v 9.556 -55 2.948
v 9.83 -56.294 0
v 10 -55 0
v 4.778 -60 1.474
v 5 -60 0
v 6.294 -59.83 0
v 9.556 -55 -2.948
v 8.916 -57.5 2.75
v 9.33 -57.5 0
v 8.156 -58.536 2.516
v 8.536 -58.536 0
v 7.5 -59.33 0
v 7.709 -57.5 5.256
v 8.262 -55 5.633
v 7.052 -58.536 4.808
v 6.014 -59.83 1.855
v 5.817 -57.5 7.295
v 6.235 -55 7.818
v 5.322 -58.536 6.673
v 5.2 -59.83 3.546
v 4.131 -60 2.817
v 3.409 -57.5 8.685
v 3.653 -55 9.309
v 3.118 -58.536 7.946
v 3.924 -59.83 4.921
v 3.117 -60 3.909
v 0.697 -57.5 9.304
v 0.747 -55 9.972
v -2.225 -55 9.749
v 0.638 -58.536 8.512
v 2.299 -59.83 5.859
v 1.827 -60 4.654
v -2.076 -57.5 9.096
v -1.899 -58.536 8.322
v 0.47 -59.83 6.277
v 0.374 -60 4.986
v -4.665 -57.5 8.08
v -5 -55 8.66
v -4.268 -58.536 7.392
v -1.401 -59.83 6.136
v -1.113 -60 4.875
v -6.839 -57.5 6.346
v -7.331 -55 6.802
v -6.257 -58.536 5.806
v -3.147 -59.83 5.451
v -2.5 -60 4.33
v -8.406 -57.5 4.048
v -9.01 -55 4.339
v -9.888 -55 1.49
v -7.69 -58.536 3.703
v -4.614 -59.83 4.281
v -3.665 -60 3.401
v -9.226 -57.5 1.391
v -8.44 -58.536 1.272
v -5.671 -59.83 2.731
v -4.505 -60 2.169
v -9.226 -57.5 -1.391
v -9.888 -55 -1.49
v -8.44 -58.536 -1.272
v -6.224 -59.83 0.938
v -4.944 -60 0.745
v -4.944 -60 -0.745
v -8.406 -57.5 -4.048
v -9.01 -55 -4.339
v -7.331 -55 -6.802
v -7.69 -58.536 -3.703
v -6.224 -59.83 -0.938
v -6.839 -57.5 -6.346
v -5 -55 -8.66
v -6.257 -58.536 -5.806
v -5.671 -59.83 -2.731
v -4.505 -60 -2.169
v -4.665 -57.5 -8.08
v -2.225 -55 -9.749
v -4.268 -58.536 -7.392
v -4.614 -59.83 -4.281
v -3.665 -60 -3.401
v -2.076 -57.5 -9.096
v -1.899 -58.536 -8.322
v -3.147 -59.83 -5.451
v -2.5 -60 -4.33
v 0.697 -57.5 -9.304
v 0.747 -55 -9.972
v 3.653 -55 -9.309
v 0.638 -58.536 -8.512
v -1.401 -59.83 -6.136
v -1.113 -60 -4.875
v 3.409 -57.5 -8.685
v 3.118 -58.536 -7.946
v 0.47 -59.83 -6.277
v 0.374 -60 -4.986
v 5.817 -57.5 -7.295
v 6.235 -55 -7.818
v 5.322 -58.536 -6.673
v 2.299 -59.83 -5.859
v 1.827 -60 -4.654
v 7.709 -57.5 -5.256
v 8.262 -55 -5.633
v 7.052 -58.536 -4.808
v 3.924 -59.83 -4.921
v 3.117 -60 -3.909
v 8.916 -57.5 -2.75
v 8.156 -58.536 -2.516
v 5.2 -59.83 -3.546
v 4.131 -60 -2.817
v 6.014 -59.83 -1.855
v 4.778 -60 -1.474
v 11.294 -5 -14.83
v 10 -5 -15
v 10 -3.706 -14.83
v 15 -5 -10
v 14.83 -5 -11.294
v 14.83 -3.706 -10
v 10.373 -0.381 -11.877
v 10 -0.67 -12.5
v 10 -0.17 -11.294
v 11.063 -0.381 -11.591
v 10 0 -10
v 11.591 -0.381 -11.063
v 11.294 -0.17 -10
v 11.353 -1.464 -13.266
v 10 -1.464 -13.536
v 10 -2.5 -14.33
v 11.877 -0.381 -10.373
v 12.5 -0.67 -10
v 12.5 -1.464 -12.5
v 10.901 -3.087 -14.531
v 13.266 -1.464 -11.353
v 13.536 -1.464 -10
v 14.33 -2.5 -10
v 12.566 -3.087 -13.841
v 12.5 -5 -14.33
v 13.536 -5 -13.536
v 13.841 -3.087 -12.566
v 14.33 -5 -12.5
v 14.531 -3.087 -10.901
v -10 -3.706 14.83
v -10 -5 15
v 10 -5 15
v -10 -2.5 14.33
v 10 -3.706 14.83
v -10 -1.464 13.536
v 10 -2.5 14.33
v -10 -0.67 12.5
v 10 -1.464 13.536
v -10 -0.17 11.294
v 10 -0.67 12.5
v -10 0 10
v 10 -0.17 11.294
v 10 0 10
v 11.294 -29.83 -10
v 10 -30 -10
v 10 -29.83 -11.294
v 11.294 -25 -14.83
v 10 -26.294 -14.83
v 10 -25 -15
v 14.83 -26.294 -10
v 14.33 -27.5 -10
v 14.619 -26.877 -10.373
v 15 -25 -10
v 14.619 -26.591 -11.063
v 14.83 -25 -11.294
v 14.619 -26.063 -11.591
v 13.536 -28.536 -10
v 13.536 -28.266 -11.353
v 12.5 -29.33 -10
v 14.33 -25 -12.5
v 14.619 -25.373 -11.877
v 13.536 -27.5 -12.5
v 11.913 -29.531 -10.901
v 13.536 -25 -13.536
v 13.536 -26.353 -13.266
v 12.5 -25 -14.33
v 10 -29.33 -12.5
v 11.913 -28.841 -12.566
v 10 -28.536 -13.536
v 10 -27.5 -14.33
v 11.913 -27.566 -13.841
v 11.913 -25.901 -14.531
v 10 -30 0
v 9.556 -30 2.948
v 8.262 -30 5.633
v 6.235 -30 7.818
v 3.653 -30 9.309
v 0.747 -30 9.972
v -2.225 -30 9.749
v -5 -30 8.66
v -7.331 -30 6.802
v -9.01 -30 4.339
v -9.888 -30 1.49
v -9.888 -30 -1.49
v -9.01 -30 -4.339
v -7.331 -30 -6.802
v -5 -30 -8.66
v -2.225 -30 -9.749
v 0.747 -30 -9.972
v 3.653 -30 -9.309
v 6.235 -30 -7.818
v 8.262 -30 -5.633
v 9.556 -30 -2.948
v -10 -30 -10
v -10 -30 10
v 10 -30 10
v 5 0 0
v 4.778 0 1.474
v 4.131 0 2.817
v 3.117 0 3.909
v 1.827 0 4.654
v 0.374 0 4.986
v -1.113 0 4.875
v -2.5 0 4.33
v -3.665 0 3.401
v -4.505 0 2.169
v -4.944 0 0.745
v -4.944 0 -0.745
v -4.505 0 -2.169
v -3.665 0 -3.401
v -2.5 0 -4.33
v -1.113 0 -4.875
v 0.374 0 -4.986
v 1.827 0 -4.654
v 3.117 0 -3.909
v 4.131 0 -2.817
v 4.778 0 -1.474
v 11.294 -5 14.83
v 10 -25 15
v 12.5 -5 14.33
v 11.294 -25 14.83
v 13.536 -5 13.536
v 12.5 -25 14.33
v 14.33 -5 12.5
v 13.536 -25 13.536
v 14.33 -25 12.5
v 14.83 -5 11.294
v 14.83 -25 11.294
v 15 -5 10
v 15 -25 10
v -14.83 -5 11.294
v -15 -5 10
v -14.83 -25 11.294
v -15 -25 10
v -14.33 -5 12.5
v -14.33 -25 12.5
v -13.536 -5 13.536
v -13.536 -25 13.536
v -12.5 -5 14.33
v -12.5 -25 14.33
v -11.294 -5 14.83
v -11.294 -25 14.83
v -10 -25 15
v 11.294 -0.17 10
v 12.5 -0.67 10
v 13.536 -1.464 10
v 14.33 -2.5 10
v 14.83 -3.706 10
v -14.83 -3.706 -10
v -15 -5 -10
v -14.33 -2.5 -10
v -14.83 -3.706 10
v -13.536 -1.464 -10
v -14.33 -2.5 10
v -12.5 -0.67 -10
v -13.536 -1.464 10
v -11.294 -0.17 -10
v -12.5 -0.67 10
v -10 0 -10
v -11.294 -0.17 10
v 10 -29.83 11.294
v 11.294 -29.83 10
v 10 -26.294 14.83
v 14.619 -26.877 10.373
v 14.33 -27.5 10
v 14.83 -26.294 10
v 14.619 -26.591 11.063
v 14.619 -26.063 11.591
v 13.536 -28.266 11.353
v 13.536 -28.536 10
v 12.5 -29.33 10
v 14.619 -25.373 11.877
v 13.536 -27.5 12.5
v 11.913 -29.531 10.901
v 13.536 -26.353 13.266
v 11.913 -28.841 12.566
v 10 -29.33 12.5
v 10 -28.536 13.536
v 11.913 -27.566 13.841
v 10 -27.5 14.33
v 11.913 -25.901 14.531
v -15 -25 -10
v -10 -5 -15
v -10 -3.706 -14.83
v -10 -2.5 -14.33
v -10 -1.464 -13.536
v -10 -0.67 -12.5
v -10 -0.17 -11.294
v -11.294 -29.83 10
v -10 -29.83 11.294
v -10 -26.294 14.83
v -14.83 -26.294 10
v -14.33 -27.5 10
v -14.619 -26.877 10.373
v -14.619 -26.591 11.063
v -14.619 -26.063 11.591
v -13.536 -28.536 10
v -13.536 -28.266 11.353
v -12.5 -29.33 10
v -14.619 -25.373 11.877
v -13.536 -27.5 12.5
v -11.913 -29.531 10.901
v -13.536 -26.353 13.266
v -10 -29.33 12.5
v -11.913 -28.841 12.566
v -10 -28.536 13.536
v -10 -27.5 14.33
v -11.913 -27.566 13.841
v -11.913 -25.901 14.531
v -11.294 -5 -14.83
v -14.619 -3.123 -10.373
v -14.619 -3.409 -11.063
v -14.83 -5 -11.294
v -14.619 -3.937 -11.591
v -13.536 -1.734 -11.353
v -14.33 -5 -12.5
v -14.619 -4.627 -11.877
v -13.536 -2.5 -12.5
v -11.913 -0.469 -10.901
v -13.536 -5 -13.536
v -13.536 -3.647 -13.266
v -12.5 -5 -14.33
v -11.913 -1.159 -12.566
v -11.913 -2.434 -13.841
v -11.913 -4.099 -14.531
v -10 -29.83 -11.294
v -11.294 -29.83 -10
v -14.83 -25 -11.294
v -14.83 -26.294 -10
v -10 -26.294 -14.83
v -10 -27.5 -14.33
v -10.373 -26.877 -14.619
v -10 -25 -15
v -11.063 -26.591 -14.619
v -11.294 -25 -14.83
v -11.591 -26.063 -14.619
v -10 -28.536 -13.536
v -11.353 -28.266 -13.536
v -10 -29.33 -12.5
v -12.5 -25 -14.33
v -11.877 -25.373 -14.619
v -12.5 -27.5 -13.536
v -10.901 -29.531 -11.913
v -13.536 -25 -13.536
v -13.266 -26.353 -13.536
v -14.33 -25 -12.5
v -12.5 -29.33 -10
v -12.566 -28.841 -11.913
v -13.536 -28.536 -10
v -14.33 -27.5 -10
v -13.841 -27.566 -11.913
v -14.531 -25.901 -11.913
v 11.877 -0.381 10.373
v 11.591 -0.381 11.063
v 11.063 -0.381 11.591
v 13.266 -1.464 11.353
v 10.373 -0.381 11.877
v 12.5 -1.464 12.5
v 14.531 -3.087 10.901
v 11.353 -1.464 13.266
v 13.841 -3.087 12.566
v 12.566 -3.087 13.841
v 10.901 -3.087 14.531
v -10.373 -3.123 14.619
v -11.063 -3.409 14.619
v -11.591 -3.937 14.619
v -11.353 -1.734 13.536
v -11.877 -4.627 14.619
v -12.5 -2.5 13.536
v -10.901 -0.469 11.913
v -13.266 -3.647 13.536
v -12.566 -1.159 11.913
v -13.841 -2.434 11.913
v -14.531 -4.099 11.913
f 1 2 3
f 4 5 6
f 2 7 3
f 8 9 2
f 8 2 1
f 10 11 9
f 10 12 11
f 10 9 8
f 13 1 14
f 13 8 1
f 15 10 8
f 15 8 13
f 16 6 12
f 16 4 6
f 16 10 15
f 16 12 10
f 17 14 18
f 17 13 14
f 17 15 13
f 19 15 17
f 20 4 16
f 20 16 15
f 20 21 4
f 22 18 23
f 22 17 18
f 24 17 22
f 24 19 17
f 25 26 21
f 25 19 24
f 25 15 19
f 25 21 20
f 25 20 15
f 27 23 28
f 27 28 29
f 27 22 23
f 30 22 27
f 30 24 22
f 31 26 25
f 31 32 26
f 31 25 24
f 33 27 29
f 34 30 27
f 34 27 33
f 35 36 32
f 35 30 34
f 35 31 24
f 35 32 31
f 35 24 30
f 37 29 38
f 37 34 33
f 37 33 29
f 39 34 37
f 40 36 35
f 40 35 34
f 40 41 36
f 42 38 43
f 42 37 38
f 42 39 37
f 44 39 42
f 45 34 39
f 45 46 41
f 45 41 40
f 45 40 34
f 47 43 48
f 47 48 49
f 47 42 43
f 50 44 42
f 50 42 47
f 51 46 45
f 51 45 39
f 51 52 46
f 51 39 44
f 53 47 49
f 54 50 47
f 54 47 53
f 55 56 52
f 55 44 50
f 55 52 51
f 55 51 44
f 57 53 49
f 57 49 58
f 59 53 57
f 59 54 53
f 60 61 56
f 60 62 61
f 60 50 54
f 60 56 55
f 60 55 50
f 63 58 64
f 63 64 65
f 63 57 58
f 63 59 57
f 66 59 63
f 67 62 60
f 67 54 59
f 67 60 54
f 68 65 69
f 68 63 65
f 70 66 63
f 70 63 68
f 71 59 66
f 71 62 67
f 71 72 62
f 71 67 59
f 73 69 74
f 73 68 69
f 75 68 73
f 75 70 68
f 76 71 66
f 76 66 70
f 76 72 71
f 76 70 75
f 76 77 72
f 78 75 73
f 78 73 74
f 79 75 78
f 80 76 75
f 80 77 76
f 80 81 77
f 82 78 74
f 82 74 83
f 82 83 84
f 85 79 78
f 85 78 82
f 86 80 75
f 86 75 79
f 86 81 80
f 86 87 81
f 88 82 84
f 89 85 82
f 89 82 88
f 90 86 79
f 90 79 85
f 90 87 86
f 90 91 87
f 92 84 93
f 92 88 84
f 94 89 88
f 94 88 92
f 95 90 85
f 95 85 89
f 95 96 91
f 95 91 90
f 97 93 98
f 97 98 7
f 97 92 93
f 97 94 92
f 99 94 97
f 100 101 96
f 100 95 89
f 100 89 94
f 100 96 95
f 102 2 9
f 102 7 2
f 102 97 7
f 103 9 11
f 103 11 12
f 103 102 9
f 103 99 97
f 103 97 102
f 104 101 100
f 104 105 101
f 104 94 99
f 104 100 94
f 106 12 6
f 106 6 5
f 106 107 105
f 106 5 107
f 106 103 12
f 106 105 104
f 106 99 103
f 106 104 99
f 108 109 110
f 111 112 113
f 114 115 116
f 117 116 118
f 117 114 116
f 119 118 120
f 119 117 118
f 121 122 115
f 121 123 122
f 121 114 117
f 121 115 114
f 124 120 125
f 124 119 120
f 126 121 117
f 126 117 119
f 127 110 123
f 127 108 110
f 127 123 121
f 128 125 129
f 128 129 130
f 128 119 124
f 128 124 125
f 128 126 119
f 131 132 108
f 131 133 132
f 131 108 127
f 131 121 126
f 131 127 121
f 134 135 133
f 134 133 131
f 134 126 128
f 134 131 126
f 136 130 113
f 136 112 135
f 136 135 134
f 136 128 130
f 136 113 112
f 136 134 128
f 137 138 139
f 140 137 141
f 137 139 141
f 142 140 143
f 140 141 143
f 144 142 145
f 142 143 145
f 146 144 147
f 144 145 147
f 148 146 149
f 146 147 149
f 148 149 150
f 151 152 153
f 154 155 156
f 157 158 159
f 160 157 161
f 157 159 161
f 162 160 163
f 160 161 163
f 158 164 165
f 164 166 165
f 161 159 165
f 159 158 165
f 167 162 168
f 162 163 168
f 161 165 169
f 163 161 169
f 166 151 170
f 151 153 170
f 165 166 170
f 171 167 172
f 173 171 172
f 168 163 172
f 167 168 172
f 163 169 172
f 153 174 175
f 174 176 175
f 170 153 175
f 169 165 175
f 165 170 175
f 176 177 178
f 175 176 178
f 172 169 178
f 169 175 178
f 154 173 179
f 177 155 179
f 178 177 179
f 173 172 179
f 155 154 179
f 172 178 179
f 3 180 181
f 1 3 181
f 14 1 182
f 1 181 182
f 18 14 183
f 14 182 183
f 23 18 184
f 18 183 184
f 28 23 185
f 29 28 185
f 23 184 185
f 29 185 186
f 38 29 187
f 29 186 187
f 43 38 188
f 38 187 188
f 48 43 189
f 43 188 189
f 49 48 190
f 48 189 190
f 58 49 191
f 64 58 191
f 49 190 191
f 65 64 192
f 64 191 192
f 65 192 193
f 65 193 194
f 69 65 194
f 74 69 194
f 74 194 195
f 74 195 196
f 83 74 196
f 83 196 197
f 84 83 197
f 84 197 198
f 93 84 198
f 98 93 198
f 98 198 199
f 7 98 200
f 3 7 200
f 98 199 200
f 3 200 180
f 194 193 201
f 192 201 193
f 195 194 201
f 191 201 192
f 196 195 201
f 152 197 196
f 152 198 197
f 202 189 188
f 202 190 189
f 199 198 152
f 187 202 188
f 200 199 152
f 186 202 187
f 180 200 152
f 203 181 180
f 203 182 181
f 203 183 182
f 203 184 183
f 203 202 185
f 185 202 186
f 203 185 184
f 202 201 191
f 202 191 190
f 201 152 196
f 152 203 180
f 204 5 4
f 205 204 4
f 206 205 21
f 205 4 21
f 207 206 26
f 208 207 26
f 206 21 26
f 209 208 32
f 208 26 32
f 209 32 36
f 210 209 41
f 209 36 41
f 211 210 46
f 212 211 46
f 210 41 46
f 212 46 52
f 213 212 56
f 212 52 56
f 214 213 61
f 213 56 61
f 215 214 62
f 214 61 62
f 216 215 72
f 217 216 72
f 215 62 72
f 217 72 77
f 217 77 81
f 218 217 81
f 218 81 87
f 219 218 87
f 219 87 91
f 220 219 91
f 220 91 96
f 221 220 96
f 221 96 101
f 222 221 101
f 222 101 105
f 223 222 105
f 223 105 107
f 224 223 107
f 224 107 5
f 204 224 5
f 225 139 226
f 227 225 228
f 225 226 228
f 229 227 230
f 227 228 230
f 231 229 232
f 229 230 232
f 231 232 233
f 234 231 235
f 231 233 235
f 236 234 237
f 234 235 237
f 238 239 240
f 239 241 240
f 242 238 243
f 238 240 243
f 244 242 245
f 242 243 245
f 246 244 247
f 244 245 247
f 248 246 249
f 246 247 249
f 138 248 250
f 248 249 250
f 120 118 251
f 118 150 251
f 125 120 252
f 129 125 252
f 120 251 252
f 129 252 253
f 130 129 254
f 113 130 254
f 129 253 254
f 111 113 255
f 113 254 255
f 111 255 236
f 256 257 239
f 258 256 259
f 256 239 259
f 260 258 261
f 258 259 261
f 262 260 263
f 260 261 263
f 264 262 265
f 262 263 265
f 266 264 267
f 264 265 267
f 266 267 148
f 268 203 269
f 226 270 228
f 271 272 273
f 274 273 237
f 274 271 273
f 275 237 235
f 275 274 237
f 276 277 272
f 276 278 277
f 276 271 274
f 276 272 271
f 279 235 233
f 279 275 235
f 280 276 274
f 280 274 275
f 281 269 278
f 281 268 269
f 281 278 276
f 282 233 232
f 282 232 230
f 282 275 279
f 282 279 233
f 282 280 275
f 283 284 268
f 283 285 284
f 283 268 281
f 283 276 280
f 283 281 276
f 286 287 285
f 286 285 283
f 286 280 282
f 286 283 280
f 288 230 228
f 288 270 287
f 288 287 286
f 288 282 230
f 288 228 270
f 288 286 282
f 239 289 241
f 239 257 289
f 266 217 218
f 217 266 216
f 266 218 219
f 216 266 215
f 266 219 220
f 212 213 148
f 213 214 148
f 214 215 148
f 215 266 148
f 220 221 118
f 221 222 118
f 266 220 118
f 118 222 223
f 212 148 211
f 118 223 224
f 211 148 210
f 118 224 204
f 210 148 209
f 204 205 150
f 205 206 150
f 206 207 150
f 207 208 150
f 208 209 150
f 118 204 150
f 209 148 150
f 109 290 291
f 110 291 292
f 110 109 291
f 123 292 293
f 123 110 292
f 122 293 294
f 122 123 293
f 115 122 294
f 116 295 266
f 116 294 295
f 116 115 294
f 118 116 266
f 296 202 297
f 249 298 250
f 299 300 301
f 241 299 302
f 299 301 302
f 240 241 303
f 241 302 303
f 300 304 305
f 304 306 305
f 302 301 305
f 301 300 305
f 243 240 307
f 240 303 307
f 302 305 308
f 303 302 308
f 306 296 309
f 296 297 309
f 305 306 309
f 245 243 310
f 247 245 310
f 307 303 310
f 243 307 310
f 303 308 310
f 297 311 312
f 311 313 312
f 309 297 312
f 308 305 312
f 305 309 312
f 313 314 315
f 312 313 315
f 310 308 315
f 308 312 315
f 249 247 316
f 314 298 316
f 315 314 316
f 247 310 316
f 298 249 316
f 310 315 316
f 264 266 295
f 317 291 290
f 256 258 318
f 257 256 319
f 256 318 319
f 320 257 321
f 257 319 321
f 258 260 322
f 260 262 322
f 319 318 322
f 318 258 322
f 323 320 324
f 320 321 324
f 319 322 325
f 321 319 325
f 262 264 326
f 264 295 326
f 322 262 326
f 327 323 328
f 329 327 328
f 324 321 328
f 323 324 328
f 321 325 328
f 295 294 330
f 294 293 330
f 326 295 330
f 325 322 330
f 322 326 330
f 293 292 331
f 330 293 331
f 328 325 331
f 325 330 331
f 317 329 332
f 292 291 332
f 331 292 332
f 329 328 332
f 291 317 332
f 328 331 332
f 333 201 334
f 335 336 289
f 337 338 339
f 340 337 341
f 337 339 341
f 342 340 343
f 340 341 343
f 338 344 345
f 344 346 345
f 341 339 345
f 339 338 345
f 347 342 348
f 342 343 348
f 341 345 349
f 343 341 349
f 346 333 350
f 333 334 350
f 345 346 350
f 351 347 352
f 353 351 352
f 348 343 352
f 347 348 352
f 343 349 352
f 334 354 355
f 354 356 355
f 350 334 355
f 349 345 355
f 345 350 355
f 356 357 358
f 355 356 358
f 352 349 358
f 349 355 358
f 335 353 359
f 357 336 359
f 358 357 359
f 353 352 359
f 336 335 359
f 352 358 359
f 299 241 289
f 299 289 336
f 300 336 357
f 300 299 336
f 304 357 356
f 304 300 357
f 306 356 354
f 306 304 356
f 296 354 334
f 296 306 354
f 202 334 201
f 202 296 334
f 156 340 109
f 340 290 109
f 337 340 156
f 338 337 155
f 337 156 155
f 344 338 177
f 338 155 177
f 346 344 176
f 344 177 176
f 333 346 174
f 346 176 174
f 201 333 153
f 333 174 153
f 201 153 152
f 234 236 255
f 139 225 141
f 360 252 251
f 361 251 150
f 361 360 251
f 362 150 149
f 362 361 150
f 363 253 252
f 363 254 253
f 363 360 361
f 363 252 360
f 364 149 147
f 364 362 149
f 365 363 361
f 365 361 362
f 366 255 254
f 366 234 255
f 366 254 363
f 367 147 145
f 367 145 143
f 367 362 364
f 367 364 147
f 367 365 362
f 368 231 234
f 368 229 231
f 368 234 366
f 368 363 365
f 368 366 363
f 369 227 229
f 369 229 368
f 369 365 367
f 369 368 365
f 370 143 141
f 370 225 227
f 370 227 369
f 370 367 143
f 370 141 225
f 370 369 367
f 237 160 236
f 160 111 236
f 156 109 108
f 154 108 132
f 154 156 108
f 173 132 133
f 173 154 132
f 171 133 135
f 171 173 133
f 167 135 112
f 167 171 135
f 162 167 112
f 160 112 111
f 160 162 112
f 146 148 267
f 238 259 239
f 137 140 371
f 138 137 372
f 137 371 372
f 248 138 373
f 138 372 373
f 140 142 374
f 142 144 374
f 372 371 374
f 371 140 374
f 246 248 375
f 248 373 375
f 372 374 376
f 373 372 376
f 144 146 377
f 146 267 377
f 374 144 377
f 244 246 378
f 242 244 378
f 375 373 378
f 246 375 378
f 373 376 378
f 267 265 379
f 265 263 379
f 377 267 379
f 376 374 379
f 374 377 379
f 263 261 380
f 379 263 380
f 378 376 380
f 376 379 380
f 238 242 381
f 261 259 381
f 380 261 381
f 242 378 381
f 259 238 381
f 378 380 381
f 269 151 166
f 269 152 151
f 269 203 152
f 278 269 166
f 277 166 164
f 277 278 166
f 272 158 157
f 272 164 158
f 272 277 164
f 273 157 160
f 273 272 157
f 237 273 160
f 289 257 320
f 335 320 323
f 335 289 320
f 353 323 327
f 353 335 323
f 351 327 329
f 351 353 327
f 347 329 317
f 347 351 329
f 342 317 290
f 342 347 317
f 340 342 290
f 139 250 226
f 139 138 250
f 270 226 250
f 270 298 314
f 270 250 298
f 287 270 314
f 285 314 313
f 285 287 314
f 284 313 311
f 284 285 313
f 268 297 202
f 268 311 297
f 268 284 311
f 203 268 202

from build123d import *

# Parameters (mm, degrees)
F0_W     = 30
F0_H     = 30
F1_DEPTH = 30
F2_R     = 10
F3_DEPTH = 30
F4_R     = 5
F5_DEPTH = 60.001
F6_R     = 4.99999


# Not quite as in the source:
# - a fillet or chamfer is up to 0.001 mm smaller than in the source, because OpenCascade refuses the exact size


with BuildPart() as f1:
    # F0 (on Front) → F1 (new body)
    with BuildSketch(Plane.XZ):
        Rectangle(F0_W, F0_H)
    extrude(amount=F1_DEPTH)

    # F2 (on face) → F3 (join)
    with BuildSketch(Plane.XZ.offset(30)):
        Circle(F2_R)
    extrude(amount=F3_DEPTH)

    # F4 (on face) → F5 (cut, through all)
    with BuildSketch(Plane.XZ.offset(60)):
        Circle(F4_R)
    extrude(amount=-F5_DEPTH, mode=Mode.SUBTRACT)

    # F6 (radius 5 in the source; OpenCascade refuses exactly that, so slightly less here)
    f6_edges = [f1.edges().sort_by_distance(p)[0] for p in [
        (0, -30, 15),
        (-15, -30, 0),
        (0, -30, -15),
        (15, -30, 0),
        (15, -15, 15),
        (15, -15, -15),
        (0, 0, -15),
        (-15, 0, 0),
        (15, 0, 0),
        (0, 0, 15),
        (-15, -15, 15),
        (-10, -60, 0),
        (-15, -15, -15),
    ]]
    fillet(f6_edges, radius=F6_R)


solid = f1.part
